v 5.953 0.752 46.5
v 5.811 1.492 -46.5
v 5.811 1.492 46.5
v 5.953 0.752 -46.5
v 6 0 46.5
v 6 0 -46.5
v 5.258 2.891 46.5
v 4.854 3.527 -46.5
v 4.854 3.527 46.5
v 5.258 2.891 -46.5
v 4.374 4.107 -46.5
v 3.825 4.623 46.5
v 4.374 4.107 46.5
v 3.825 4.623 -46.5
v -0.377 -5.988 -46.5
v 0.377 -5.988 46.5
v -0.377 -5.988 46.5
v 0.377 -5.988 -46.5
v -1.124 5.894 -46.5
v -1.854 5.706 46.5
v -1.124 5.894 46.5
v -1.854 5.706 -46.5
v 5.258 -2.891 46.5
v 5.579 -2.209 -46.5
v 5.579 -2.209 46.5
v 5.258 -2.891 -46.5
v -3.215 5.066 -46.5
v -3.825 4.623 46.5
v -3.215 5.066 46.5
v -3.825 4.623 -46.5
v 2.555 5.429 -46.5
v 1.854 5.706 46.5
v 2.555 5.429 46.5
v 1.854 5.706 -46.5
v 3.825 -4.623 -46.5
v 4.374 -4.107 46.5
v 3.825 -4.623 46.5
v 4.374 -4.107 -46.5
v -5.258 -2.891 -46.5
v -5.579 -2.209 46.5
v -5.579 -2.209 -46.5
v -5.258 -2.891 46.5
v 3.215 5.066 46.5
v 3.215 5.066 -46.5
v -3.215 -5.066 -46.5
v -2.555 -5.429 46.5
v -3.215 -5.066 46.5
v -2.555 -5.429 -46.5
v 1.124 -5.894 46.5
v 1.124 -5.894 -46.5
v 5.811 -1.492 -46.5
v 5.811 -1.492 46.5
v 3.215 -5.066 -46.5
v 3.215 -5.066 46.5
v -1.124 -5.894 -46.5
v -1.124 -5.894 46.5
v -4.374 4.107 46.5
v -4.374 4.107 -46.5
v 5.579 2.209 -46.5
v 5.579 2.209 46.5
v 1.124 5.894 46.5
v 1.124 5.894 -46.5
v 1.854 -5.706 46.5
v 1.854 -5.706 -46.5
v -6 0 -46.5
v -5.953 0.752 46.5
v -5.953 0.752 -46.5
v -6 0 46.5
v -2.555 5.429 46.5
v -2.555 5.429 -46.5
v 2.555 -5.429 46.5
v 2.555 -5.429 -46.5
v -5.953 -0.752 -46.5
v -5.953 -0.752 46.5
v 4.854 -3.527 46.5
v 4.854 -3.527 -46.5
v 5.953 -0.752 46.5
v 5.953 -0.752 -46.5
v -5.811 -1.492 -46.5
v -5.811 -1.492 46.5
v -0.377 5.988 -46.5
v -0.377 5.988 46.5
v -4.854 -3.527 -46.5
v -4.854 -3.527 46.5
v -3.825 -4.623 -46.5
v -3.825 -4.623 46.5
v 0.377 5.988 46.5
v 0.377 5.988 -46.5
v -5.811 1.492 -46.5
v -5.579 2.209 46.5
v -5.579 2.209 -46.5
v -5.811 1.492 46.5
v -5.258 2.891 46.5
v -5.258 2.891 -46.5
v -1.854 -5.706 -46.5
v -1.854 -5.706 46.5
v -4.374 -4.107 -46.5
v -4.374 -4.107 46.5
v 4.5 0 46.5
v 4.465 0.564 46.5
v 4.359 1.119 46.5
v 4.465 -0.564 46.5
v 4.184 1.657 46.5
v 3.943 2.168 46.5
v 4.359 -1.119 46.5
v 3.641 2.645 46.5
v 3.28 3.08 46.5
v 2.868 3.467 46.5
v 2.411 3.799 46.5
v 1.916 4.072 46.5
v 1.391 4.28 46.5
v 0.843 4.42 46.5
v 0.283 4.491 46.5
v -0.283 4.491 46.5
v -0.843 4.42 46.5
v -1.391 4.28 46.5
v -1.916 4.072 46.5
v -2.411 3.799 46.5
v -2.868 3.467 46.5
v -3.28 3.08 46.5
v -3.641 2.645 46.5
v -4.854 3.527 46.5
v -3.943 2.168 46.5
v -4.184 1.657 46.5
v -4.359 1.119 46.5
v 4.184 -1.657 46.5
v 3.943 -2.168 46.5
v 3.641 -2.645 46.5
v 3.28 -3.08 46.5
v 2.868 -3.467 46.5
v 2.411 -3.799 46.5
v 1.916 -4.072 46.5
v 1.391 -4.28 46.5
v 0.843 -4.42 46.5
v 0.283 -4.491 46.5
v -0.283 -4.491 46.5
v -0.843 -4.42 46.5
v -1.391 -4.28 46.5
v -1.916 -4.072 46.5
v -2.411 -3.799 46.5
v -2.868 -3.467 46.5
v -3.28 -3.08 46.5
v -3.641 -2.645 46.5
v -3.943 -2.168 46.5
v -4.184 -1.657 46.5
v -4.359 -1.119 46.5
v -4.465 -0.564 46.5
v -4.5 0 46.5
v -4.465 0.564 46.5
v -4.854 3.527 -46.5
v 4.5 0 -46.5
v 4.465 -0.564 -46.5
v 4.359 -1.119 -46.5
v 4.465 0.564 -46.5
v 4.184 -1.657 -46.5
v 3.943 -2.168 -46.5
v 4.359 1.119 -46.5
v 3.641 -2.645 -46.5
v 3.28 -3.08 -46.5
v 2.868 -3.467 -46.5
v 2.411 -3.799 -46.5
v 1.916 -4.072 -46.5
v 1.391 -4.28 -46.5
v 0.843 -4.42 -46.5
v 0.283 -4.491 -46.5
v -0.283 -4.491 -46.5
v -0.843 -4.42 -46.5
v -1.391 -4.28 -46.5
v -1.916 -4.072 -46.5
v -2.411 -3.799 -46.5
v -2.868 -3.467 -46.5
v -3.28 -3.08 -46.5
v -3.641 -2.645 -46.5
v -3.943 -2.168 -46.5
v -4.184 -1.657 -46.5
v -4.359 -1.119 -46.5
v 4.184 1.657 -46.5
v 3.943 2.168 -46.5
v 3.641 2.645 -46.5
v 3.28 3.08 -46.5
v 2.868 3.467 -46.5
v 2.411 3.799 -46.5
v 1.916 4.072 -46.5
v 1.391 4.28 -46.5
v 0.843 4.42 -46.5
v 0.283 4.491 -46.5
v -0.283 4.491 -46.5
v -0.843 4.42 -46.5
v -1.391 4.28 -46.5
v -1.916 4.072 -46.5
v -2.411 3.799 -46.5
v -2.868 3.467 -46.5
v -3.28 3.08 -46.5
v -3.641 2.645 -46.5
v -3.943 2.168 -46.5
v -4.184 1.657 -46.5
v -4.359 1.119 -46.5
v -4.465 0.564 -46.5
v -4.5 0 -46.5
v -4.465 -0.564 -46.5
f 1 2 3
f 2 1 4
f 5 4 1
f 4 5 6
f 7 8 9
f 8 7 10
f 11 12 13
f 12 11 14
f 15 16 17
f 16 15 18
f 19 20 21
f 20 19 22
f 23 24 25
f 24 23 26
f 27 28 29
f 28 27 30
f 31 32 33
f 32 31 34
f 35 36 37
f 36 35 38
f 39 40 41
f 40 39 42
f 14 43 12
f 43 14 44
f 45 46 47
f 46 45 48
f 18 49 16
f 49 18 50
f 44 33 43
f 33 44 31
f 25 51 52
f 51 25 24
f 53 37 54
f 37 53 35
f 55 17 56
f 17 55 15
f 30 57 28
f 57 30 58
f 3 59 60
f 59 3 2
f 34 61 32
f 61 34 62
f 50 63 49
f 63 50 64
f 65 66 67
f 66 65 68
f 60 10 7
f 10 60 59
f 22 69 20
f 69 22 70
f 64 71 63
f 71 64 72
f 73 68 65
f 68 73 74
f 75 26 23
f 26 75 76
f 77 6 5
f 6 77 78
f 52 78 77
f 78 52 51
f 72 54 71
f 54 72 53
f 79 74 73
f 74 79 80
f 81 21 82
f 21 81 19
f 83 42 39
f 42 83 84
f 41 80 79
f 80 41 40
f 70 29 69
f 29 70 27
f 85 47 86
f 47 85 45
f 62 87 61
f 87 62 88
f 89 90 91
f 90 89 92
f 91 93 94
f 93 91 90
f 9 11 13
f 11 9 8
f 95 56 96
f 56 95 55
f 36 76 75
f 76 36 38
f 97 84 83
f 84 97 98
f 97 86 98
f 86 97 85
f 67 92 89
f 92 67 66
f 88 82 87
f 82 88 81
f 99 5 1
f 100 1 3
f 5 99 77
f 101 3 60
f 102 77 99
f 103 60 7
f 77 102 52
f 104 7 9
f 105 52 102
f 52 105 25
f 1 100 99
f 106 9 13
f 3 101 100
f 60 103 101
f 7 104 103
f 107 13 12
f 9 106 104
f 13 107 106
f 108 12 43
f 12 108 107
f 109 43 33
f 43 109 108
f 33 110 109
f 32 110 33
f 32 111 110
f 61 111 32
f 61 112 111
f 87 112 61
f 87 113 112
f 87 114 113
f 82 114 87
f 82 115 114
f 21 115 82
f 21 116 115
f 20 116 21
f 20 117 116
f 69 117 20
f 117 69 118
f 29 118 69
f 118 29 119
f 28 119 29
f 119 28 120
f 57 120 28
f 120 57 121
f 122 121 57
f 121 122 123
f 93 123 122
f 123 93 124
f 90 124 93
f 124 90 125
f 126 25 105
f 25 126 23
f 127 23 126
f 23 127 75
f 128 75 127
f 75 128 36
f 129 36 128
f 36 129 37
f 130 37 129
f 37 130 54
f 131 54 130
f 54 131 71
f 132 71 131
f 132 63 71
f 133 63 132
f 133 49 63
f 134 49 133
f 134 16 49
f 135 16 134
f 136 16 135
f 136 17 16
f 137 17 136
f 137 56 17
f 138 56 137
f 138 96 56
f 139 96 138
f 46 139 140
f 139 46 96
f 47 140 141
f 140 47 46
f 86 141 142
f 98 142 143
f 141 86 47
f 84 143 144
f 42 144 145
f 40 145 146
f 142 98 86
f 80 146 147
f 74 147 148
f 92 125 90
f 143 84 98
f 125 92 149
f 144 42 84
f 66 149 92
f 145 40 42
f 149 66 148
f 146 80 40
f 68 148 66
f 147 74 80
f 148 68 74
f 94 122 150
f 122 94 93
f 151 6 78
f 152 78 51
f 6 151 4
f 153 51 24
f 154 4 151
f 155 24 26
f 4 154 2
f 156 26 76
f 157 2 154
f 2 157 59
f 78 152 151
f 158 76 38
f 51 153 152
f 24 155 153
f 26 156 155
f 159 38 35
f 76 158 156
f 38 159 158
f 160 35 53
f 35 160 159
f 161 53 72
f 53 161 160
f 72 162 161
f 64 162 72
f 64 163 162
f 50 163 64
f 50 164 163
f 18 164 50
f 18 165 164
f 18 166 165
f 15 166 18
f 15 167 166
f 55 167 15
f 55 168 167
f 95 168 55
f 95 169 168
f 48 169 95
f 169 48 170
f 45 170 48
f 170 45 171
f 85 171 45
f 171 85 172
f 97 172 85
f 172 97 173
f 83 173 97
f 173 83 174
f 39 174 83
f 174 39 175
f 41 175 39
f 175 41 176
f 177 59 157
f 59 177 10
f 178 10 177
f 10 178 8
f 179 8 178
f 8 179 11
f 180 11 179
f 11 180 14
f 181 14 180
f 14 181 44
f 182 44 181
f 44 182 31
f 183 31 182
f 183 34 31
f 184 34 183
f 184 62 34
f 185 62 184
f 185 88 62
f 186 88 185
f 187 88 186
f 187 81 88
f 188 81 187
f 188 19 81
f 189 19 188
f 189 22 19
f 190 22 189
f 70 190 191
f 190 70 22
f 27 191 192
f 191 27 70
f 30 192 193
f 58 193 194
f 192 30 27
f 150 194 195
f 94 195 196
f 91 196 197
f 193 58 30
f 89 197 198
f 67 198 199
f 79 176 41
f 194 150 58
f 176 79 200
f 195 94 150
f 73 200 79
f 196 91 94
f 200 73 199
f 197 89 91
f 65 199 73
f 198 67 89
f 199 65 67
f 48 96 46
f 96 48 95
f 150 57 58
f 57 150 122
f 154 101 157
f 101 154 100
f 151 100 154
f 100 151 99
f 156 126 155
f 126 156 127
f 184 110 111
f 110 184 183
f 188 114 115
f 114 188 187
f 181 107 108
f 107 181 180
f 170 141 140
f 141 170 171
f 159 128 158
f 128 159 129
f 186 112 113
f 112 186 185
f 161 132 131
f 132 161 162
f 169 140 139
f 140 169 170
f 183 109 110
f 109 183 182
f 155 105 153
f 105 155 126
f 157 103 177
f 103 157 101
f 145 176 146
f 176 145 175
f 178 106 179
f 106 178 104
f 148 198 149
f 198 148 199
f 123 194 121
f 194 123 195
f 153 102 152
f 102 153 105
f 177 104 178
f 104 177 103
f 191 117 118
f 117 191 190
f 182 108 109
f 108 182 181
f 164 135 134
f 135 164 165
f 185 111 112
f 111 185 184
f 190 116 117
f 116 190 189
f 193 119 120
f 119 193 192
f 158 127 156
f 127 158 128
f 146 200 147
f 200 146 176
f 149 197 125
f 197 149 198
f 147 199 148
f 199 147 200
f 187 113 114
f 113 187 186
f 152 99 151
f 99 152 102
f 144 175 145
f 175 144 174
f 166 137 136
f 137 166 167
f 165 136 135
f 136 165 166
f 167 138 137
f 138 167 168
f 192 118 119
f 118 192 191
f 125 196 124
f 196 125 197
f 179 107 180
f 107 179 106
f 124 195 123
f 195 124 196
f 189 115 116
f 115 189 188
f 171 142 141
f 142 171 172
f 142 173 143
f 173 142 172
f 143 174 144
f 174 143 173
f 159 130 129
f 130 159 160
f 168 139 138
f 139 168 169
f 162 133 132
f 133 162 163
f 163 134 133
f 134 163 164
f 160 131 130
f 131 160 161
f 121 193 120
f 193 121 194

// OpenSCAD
$fn = 50;


difference() {
	union() {
		translate(v = [0, 0, -46.5000000000]) {
			cylinder(h = 93, r = 6.0000000000);
		}
	}
	union() {
		translate(v = [0, 0, -100.0000000000]) {
			cylinder(h = 200, r = 4.5000000000);
		}
	}
}
